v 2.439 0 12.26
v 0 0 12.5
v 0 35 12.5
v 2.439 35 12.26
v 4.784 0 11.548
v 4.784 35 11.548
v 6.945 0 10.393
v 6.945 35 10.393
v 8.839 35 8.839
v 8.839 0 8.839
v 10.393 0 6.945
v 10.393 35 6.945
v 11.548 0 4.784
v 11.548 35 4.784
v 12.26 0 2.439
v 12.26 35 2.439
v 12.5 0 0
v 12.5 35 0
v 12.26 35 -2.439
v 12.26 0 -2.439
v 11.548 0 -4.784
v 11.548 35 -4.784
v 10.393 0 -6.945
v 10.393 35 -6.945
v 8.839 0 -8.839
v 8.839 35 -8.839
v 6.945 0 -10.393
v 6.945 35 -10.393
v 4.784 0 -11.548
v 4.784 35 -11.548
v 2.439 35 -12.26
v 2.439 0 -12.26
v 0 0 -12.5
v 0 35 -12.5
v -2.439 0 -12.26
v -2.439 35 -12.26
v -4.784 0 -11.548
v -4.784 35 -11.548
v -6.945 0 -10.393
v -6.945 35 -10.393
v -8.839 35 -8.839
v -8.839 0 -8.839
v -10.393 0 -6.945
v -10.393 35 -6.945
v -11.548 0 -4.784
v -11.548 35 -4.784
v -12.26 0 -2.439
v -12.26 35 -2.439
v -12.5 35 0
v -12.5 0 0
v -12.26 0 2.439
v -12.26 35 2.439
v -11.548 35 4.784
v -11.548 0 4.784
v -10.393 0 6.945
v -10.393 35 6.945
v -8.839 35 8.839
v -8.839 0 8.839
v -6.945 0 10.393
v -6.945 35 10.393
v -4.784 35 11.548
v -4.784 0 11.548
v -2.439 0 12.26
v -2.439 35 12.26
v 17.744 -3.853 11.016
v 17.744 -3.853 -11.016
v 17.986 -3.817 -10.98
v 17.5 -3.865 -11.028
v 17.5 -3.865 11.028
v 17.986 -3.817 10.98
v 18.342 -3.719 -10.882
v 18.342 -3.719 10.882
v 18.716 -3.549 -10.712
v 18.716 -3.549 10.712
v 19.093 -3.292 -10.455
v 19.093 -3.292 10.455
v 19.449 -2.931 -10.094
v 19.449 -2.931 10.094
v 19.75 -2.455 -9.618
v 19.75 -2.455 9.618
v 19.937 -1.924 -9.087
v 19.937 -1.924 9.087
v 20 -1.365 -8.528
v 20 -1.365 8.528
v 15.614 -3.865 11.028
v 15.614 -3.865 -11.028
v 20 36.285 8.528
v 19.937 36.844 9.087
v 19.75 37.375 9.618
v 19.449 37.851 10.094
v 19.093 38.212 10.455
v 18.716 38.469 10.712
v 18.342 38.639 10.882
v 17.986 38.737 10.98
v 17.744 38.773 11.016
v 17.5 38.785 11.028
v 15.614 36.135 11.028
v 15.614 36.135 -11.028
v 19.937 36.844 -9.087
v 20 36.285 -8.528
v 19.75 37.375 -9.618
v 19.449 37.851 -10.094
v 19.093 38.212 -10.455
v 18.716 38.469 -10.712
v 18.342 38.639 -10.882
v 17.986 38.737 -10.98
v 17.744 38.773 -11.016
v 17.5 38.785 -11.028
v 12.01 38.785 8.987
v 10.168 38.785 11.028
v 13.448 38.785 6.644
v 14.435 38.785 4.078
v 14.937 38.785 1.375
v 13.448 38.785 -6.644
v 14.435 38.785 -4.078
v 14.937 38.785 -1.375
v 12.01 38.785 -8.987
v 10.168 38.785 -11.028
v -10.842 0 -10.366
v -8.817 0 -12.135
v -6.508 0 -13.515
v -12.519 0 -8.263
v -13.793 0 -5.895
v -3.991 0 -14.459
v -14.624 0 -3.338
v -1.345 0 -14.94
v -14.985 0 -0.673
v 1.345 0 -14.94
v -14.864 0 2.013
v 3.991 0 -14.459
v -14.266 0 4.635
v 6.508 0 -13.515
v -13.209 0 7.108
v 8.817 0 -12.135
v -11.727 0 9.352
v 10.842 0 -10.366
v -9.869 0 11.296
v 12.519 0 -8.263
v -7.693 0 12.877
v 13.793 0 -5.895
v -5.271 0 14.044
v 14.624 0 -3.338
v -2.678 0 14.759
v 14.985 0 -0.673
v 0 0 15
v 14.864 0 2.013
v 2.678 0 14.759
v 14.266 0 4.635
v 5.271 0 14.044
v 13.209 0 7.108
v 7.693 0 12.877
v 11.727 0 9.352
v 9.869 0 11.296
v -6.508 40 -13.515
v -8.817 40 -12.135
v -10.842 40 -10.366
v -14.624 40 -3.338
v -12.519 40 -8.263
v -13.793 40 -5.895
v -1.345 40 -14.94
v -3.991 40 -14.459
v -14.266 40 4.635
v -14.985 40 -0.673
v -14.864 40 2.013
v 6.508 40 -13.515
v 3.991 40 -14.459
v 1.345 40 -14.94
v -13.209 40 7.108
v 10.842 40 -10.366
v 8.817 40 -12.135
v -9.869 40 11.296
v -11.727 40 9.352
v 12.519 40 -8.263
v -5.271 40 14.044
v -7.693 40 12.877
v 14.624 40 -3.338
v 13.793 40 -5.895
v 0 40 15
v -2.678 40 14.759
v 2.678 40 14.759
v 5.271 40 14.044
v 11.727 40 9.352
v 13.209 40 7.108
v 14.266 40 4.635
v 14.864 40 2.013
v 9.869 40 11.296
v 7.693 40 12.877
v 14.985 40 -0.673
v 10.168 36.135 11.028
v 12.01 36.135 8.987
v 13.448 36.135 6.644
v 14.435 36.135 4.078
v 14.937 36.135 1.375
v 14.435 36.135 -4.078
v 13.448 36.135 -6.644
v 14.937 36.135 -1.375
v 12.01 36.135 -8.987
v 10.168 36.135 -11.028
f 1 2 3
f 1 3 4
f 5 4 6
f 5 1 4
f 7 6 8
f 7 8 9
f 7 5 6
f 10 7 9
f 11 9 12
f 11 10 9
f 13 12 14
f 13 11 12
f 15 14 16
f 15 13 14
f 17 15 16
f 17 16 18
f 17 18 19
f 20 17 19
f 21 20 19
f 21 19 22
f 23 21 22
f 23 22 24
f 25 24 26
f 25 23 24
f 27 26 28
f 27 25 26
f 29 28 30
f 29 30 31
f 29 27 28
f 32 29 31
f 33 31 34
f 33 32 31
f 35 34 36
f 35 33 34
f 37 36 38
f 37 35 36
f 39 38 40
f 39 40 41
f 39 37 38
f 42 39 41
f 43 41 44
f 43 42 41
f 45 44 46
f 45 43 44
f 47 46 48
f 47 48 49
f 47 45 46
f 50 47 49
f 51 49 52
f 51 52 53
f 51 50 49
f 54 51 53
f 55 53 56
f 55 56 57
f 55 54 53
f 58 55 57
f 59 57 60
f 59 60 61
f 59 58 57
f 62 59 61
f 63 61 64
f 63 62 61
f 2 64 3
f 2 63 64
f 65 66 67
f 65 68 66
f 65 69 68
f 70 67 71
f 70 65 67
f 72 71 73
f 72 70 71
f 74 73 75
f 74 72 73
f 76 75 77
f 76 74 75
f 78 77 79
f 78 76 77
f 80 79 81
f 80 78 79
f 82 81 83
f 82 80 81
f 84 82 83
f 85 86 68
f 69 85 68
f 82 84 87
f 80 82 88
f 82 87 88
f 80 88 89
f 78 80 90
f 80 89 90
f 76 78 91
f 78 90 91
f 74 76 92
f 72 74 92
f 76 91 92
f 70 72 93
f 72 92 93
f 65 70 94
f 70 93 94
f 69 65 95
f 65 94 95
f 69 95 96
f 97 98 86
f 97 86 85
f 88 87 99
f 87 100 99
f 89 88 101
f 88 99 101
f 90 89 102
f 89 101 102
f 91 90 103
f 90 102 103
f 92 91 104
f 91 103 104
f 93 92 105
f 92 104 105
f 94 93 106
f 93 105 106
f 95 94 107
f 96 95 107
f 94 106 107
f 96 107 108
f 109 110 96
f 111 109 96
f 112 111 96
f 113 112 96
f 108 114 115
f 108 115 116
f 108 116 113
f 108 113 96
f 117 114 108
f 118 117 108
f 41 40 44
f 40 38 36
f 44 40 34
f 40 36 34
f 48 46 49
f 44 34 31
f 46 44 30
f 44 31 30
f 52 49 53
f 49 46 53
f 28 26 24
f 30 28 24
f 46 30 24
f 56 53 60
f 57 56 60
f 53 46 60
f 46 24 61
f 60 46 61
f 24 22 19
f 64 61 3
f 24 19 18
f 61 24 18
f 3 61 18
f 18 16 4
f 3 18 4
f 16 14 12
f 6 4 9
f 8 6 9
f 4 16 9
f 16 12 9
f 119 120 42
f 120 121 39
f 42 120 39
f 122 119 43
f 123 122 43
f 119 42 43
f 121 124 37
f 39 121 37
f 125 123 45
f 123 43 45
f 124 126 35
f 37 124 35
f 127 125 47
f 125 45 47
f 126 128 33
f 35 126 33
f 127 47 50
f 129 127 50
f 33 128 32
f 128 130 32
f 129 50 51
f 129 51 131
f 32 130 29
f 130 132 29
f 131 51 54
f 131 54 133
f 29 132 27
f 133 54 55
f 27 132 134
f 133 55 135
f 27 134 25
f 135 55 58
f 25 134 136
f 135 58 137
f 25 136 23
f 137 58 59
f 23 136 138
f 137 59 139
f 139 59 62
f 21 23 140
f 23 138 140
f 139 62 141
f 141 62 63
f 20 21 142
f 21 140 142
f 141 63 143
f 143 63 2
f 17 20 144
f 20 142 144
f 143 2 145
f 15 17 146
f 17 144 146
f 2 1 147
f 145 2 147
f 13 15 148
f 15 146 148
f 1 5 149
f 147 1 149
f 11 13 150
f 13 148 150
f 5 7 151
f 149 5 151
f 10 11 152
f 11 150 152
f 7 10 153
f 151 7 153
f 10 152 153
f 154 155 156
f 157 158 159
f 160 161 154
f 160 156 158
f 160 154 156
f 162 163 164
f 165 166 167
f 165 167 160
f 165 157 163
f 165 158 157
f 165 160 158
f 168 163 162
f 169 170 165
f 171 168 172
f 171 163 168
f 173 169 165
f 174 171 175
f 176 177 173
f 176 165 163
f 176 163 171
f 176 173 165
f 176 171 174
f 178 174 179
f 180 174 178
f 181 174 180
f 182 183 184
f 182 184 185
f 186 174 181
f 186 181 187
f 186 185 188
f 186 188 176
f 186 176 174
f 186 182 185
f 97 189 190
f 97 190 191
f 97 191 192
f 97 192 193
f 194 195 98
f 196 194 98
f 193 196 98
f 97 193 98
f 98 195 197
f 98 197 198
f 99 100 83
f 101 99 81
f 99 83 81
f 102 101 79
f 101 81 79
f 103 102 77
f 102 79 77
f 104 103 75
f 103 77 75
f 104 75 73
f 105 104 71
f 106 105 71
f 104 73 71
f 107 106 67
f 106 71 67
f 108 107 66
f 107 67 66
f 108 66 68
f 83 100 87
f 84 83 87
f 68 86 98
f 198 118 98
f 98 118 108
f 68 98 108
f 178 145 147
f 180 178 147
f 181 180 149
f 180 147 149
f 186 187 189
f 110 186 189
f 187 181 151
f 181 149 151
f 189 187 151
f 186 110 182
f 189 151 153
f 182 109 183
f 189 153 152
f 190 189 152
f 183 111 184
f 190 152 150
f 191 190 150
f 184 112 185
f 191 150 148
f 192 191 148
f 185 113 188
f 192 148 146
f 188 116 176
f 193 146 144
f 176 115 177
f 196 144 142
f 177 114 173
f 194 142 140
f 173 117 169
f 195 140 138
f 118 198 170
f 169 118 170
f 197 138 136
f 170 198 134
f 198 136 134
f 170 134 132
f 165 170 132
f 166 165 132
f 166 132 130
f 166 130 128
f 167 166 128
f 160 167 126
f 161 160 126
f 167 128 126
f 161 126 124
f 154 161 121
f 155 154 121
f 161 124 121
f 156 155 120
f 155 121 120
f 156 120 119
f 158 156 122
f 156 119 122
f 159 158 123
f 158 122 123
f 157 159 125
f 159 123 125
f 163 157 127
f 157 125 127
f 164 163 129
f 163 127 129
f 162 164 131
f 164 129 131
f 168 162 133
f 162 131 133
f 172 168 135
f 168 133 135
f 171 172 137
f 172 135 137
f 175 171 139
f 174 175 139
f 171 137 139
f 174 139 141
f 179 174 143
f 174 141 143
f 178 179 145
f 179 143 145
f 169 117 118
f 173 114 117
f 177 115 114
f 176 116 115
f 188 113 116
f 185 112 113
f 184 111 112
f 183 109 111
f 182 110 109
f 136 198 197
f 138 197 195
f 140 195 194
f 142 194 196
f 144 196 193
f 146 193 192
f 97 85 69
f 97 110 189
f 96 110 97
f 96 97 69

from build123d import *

# Parameters (mm, degrees)
SKETCH2_R           = 15
SKETCH2_R_2         = 12.5
BOSS_EXTRUDE1_DEPTH = 35
SKETCH3_R           = 15
BOSS_EXTRUDE2_DEPTH = 5
SKETCH4_W           = 22.056214186
SKETCH4_H           = 2.649940184
BOSS_EXTRUDE3_DEPTH = 10
SKETCH5_W           = 4.385639536
SKETCH5_H           = 22.056214186
BOSS_EXTRUDE4_DEPTH = 40
FILLET1_R           = 2.5


with BuildPart() as part:
    # Sketch2 → Boss-Extrude1 (new body)
    with BuildSketch(Plane(origin=(0, 0, 0), x_dir=(1, 0, 0), z_dir=(0, 1, 0))):
        with Locations(Location((0, 0, 0), (0, 0, 270))):
            Circle(SKETCH2_R)
        with Locations(Location((0, 0, 0), (0, 0, 270))):
            Circle(SKETCH2_R_2, mode=Mode.SUBTRACT)
    extrude(amount=BOSS_EXTRUDE1_DEPTH)

    # Sketch3 → Boss-Extrude2 (add)
    with BuildSketch(Plane(origin=(0, 35, 0), x_dir=(1, 0, 0), z_dir=(0, 1, 0))):
        with Locations(Location((0, 0, 0), (0, 0, 270))):
            Circle(SKETCH3_R)
    extrude(amount=BOSS_EXTRUDE2_DEPTH)

    # Sketch4 → Boss-Extrude3 (add)
    with BuildSketch(Plane(origin=(10, 0, 0), x_dir=(0, 0, -1), z_dir=(1, 0, 0))):
        with Locations((0, 37.460010141)):
            Rectangle(SKETCH4_W, SKETCH4_H)
    extrude(amount=BOSS_EXTRUDE3_DEPTH)

    # Sketch5 → Boss-Extrude4 (add)
    with BuildSketch(Plane.XZ.offset(-36.135040049)):
        with Locations((17.807180232, 0)):
            Rectangle(SKETCH5_W, SKETCH5_H)
    extrude(amount=BOSS_EXTRUDE4_DEPTH)

    # Fillet1
    fillet1_edges = [part.edges().sort_by_distance(p)[0] for p in [
        (20, 17.460010141, -11.028107093),
        (20, 38.784980233, 0),
        (20, 17.460010141, 11.028107093),
        (20, -3.864959951, 0),
    ]]
    fillet(fillet1_edges, radius=FILLET1_R)


solid = part.part
